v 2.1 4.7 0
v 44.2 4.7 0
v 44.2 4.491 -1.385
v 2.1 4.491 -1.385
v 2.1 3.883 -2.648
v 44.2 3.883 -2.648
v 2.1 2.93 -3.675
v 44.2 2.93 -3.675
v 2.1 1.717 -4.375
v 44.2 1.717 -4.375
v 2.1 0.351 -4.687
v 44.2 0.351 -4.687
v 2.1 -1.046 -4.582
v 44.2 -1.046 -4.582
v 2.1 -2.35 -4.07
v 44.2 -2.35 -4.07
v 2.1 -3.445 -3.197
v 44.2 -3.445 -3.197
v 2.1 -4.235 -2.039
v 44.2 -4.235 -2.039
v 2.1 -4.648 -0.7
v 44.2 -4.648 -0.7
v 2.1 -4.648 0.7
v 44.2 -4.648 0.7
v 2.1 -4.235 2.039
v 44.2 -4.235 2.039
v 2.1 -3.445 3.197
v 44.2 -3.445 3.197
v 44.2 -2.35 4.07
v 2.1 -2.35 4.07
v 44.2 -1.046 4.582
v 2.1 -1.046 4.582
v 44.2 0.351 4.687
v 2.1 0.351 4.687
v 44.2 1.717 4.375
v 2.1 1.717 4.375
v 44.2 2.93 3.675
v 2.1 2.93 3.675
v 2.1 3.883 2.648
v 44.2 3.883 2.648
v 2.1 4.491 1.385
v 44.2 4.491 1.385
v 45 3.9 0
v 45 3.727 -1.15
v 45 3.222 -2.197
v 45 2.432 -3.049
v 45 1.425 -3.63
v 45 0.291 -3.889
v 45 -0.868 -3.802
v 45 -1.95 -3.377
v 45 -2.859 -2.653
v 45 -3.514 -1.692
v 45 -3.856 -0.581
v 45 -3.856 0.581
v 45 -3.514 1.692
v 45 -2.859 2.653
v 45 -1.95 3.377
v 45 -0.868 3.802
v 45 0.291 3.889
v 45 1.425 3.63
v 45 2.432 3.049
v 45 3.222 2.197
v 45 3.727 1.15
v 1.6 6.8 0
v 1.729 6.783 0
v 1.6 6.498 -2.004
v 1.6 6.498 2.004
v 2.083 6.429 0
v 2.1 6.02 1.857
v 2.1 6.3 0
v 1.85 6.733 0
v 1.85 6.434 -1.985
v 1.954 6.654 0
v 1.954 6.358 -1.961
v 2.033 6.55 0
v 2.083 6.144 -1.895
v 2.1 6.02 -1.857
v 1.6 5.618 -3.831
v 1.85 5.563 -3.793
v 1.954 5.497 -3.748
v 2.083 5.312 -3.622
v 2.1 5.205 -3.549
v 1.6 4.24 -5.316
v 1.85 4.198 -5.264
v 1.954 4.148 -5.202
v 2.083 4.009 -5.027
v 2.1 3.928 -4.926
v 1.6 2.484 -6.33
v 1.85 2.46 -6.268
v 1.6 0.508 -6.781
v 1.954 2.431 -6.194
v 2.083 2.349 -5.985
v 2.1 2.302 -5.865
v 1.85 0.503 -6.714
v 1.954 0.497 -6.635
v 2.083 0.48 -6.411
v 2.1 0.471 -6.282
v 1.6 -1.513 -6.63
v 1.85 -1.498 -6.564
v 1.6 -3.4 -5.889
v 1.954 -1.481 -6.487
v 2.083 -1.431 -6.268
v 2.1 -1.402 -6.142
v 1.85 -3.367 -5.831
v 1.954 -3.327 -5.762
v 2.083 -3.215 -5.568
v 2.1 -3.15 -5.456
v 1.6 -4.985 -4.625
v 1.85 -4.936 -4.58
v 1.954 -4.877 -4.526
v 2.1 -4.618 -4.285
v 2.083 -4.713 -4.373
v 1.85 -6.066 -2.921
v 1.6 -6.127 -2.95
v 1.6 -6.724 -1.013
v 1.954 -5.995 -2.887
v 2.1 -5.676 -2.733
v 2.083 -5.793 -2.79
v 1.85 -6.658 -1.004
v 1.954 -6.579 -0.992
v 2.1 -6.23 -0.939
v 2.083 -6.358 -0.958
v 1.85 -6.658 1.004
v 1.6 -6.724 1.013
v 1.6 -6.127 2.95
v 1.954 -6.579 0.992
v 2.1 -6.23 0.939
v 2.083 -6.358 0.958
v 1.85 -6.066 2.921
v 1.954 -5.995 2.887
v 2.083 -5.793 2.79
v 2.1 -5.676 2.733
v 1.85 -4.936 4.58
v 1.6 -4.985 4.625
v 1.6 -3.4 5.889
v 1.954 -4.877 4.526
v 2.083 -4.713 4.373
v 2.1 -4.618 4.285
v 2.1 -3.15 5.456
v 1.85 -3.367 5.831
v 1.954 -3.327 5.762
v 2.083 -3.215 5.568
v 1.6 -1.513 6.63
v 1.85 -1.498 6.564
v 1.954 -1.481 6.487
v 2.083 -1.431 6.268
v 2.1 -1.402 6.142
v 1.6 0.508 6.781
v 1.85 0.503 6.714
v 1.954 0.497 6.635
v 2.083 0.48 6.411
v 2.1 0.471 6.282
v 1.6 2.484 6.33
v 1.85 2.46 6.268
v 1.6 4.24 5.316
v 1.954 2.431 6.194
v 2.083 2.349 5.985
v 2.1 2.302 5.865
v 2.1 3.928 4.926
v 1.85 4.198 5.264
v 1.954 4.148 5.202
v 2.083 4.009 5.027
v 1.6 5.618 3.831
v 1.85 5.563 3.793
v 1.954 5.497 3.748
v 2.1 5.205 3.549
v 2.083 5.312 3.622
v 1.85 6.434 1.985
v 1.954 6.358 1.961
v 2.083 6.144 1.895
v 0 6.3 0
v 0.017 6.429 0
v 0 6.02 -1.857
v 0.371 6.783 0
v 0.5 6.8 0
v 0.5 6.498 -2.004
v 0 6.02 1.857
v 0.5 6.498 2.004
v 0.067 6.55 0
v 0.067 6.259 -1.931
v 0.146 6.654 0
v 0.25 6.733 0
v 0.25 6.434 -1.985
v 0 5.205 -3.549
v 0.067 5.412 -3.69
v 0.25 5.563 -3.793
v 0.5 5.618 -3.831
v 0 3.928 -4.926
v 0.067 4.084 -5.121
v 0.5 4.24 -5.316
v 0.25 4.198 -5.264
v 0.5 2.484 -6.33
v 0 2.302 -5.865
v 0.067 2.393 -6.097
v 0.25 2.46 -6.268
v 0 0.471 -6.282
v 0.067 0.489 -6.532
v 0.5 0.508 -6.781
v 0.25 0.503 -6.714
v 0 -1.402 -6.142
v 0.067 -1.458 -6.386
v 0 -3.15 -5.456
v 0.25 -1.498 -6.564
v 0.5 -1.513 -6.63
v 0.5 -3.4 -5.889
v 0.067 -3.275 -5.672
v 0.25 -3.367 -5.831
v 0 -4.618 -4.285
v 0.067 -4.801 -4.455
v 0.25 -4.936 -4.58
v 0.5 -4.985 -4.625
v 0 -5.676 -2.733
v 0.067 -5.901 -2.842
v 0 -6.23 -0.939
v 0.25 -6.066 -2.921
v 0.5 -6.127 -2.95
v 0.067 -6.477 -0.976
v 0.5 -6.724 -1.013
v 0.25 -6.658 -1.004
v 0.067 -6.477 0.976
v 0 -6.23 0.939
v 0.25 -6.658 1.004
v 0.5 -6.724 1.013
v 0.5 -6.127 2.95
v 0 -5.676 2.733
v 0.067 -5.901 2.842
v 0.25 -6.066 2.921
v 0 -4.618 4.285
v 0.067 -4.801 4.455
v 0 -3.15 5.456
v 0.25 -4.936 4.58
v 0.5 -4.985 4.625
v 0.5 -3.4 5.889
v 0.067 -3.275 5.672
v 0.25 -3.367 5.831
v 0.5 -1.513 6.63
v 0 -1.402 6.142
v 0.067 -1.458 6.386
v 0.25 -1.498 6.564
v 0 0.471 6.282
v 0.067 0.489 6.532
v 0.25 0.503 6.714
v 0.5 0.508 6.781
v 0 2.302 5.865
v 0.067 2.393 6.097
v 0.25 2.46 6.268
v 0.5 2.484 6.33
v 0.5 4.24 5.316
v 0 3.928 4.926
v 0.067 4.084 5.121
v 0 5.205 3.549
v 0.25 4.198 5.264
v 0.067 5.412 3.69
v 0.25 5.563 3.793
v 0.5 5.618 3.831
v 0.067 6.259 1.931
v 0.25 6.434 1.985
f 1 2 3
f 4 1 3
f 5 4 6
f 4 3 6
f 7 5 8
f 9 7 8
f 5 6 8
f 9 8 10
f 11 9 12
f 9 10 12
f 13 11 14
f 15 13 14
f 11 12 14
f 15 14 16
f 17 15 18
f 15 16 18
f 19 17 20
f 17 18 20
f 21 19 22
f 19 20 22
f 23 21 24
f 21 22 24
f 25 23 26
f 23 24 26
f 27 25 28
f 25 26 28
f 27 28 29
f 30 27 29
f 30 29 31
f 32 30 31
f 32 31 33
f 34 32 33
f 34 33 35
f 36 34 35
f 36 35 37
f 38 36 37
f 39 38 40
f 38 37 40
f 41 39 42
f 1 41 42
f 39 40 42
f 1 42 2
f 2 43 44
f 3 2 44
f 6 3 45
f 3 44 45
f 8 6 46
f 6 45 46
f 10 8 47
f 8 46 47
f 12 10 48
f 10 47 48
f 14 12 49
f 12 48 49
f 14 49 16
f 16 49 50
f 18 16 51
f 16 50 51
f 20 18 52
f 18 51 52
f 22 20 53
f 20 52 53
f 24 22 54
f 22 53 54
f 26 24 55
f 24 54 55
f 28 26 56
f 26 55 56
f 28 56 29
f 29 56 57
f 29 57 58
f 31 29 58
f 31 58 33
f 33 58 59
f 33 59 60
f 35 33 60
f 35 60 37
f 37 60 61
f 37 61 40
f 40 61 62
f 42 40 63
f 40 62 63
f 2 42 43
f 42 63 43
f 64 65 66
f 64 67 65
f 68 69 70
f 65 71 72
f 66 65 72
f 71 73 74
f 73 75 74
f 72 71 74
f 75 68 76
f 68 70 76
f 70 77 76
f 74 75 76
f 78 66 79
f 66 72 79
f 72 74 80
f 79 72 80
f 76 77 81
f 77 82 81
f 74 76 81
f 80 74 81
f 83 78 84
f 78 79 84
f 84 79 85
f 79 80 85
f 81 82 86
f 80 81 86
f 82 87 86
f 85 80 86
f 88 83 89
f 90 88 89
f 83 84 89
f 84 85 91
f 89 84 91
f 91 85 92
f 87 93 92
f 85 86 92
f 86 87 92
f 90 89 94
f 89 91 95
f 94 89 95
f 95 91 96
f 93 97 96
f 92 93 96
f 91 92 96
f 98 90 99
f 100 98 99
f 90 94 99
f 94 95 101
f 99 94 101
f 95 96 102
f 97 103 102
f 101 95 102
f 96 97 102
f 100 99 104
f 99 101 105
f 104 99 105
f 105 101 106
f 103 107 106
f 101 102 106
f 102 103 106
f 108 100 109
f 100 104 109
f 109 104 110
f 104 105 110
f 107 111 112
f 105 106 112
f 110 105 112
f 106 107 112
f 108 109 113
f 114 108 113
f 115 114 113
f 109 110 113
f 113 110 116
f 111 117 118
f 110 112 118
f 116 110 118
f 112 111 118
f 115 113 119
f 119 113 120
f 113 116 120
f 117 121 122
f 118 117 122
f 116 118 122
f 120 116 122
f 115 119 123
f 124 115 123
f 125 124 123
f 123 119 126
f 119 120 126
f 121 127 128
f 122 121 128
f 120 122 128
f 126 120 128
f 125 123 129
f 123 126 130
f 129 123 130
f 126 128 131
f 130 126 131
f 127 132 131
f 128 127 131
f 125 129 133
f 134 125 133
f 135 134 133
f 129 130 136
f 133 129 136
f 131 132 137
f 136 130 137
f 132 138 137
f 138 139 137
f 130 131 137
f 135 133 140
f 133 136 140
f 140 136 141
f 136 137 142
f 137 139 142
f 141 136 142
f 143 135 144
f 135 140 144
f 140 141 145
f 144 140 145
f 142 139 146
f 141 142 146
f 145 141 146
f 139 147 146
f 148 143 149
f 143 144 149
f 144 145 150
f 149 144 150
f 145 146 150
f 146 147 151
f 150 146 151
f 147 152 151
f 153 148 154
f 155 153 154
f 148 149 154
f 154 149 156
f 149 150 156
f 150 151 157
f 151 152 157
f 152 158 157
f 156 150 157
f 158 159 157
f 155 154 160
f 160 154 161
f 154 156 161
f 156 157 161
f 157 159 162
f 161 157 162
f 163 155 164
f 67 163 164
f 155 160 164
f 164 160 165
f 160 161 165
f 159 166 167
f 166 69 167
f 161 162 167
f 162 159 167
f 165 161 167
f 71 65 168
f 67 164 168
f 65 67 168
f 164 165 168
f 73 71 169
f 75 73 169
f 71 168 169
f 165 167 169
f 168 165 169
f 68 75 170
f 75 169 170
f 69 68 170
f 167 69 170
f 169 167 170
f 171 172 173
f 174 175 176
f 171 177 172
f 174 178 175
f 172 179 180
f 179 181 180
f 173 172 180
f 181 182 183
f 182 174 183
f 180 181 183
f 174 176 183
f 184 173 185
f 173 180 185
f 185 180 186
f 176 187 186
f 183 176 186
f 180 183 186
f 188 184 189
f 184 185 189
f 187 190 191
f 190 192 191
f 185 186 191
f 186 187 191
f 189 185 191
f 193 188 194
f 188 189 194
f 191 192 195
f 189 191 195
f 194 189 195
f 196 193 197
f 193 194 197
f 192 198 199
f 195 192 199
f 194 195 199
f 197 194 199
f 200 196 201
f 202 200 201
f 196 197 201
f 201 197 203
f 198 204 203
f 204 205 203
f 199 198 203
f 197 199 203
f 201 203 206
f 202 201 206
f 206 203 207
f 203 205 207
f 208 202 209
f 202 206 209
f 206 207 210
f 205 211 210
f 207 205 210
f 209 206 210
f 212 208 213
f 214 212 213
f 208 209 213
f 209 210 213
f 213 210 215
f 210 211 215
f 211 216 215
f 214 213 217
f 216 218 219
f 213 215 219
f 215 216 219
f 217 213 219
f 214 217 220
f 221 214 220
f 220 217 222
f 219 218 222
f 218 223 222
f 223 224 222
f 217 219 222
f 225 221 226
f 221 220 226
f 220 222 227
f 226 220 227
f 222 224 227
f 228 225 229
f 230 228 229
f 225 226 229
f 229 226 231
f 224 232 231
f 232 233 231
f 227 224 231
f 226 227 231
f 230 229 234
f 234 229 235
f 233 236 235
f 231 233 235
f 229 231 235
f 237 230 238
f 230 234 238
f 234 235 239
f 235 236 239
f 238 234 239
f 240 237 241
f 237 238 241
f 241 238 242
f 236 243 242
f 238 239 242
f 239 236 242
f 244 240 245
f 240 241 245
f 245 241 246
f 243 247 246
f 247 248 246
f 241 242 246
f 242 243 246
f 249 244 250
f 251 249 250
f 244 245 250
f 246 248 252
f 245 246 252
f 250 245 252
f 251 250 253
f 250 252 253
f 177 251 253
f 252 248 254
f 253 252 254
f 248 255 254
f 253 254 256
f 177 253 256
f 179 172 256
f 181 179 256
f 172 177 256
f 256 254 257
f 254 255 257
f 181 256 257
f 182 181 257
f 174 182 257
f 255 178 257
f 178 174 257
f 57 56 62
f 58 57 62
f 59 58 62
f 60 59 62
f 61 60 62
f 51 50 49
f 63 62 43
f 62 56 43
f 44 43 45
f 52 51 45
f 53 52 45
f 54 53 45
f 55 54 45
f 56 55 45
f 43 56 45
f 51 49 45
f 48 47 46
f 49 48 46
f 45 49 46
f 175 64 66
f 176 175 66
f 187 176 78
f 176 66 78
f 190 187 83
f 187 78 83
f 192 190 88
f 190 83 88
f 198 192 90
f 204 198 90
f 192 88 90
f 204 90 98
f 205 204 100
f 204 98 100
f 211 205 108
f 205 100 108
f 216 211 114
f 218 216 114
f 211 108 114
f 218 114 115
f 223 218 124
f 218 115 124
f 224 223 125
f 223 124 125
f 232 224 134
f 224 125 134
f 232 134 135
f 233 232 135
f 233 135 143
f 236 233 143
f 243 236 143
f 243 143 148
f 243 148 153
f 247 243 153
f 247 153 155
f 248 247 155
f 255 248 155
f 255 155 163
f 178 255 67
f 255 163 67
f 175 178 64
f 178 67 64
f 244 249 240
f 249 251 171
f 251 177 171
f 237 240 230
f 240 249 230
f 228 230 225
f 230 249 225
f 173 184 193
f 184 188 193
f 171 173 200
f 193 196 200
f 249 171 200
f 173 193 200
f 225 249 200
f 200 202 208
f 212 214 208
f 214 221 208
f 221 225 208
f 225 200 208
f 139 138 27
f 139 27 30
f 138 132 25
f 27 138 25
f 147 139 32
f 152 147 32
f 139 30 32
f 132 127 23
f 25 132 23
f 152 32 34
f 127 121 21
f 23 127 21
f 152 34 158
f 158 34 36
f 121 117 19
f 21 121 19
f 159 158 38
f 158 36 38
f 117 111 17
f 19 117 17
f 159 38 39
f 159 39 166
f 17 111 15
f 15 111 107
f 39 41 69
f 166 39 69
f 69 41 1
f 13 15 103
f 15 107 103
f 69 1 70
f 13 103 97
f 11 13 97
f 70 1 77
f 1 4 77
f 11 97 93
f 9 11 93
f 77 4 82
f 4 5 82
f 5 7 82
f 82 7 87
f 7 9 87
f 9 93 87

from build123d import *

# Parameters (mm, degrees)
FILLET1_R     = 0.5
CHAMFER1_SIZE = 0.8


with BuildPart() as part:
    # Sketch1 → Revolve1 (revolve)
    with BuildSketch(Plane.XY):
        Polygon((0, 0), (0, 6.8), (2.1, 6.8), (2.1, 4.7), (45, 4.7), (45, 0), align=None)
    revolve(axis=Axis((45, 0, 0), (-1, 0, 0)))

    # Fillet1
    fillet1_edges = [part.edges().sort_by_distance(p)[0] for p in [
        (2.1, -6.8, 0),
        (0, -6.8, 0),
    ]]
    fillet(fillet1_edges, radius=FILLET1_R)

    # Chamfer1
    chamfer1_edges = [part.edges().sort_by_distance(p)[0] for p in [
        (45, -4.7, 0),
    ]]
    chamfer(chamfer1_edges, length=CHAMFER1_SIZE)


solid = part.part
